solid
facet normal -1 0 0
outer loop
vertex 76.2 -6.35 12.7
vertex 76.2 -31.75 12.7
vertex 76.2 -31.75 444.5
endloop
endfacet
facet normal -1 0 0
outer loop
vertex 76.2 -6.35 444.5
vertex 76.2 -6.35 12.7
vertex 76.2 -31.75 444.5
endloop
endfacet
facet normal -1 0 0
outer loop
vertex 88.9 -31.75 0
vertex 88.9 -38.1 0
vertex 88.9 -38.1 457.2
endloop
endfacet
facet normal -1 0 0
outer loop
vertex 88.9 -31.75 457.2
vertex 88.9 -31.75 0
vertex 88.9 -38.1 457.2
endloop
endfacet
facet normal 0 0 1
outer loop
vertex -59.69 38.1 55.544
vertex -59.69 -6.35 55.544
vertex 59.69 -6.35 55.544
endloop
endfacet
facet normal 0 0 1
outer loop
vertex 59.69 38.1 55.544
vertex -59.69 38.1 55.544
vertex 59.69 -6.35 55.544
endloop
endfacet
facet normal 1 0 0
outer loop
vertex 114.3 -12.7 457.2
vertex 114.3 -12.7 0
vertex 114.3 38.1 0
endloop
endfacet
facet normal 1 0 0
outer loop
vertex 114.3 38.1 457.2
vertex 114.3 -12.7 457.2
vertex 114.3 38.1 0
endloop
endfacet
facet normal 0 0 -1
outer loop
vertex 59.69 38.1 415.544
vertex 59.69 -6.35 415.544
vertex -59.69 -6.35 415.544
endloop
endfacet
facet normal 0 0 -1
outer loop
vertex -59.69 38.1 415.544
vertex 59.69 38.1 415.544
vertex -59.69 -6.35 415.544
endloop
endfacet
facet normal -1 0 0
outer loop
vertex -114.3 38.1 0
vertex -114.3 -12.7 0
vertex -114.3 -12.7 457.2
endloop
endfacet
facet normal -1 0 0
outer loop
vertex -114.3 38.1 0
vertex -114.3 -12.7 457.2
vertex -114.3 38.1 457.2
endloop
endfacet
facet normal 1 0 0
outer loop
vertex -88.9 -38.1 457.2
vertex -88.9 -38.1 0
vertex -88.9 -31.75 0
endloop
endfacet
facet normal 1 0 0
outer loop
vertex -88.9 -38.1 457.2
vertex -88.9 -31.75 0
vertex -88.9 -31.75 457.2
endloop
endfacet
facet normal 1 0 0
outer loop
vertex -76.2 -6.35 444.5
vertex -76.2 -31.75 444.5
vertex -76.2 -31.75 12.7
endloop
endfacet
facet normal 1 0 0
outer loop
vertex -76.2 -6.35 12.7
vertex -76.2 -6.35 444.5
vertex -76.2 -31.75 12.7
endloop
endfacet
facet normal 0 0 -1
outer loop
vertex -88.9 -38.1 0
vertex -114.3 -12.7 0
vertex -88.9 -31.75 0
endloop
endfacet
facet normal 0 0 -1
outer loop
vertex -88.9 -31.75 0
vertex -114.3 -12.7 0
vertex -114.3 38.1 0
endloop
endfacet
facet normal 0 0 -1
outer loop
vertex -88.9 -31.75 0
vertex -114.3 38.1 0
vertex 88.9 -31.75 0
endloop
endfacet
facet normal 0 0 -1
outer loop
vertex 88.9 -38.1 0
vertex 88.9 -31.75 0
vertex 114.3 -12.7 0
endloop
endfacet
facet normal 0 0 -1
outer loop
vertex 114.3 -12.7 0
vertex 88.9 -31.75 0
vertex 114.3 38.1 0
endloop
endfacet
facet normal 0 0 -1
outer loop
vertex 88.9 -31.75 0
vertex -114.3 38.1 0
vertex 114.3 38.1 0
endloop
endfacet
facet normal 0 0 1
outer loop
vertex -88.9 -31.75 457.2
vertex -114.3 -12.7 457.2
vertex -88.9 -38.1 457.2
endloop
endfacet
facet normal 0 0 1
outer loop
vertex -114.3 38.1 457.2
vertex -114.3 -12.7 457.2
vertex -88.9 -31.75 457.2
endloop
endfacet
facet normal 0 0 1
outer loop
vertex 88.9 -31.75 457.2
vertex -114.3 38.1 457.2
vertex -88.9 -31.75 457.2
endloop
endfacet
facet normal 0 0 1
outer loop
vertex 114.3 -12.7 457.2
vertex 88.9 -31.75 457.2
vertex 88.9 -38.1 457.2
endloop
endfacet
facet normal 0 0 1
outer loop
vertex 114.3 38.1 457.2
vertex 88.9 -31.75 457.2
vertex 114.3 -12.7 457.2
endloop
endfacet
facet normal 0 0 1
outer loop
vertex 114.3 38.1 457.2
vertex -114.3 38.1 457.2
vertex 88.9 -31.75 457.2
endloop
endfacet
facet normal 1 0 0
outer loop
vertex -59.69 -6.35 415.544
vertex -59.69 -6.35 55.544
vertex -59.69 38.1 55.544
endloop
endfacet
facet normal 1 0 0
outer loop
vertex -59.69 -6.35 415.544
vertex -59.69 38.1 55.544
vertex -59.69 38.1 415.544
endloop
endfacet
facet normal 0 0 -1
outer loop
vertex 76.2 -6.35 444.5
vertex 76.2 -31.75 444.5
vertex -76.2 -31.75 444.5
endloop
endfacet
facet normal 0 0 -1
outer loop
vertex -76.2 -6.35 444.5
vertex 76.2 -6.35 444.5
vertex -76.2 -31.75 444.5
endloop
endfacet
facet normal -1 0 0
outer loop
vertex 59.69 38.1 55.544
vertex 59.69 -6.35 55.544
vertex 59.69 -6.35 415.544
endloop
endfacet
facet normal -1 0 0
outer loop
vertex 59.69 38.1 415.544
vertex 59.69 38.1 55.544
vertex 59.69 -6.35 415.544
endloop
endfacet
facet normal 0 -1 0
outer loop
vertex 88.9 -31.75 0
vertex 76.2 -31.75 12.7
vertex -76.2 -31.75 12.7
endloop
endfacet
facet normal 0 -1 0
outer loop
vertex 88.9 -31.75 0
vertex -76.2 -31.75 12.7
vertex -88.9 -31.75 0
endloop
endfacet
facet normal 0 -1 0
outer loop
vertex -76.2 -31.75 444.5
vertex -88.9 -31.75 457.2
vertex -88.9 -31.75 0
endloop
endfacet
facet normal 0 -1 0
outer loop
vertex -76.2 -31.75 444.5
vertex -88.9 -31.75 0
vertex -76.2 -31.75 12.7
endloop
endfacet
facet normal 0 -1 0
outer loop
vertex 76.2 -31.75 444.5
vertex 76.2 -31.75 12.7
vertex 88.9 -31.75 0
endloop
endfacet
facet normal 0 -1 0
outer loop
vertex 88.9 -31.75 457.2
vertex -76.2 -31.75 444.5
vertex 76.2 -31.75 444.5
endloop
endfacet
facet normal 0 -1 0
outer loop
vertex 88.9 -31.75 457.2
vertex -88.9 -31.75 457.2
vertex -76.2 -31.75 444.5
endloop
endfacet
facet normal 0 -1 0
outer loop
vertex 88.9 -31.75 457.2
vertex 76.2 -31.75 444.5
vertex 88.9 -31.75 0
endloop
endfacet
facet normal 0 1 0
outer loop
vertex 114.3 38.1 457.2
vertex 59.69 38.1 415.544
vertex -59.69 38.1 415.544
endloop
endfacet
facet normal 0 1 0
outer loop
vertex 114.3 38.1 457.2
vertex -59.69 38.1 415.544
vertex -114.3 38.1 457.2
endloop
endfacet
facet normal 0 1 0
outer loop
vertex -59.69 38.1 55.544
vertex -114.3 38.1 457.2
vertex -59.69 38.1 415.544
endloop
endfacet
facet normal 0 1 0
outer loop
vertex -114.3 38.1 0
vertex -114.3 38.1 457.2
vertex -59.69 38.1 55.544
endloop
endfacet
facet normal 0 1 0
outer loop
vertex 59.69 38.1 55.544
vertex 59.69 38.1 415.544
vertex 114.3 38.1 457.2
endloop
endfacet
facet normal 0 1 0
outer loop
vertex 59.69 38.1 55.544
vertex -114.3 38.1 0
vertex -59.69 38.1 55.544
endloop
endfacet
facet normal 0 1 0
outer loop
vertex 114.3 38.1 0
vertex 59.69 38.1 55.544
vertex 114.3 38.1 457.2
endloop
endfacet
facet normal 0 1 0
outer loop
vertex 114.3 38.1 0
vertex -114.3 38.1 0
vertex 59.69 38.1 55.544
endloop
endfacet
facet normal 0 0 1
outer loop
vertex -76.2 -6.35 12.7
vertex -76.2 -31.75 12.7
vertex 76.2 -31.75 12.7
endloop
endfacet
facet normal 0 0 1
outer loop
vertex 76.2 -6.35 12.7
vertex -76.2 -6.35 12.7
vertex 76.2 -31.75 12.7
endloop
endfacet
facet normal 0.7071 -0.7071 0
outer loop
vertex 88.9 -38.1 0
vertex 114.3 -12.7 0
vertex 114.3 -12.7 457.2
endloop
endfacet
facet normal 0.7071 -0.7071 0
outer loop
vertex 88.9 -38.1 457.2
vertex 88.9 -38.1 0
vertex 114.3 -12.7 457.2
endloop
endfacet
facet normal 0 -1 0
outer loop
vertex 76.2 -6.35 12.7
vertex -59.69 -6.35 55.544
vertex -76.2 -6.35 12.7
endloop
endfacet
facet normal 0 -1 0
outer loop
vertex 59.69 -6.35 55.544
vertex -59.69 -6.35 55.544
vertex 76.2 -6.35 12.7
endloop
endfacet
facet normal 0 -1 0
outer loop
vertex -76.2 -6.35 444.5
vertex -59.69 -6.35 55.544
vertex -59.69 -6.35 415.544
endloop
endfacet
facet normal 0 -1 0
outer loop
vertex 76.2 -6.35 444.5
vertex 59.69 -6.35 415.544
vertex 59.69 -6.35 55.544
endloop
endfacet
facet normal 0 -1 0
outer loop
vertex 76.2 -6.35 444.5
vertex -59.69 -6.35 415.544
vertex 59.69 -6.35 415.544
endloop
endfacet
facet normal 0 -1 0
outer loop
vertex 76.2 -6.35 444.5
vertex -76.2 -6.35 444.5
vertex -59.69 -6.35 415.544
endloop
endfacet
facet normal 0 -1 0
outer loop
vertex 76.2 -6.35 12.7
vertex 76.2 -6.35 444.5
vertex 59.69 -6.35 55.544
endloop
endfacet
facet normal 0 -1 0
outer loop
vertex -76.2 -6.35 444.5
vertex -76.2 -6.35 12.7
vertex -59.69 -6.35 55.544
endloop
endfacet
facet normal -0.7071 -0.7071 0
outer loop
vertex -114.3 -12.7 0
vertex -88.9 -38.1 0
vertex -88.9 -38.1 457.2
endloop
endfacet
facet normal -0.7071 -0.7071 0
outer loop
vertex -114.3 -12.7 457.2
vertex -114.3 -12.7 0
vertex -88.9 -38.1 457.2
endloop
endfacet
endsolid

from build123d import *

# Parameters (mm, degrees)
F0_W        = 228.6
F0_H        = 76.2
F1_DEPTH    = 457.2
F2_SIZE     = 25.4
F3_W        = 59.69
F3_H        = 360
F4_DEPTH    = 76.2
F1_FACE_W   = 177.8
F1_FACE_H   = 457.2
F1_FACE_W_2 = 119.38
F1_FACE_H_2 = 360
F5_DEPTH    = 6.35
F6_DEPTH    = 31.75


with BuildPart() as f1:
    # F0 (on Top) → F1 (new body)
    with BuildSketch(Plane.XY):
        Rectangle(F0_W, F0_H)
    extrude(amount=F1_DEPTH)

    # F2
    f2_edges = [f1.edges().sort_by_distance(p)[0] for p in [
        (-114.3, -38.1, 228.6),
        (114.3, -38.1, 228.6),
    ]]
    chamfer(f2_edges, length=F2_SIZE)

    # F3 (on face) → F4 (cut)
    with BuildSketch(Plane.XZ.offset(38.1)):
        with Locations((29.845, 235.544)):
            Rectangle(F3_W, F3_H)
        with Locations((-29.845, 235.544)):
            Rectangle(F3_W, F3_H)
    extrude(amount=-F4_DEPTH, mode=Mode.SUBTRACT)

    # F3 (on face) + F1_face (on face) → F5 (cut)
    with BuildSketch(Plane.XZ.offset(38.1)):
        Polygon((-76.2, 12.7), (0, 12.7), (0, 55.544), (-59.69, 55.544), (-59.69, 415.544), (0, 415.544), (0, 444.5), (-76.2, 444.5), align=None)
        Polygon((0, 55.544), (0, 12.7), (76.2, 12.7), (76.2, 444.5), (0, 444.5), (0, 415.544), (59.69, 415.544), (59.69, 55.544), align=None)
    with BuildSketch(Plane(origin=(0, -38.1, 228.6), x_dir=(1, 0, 0), z_dir=(0, -1, 0))):
        Rectangle(F1_FACE_W, F1_FACE_H)
        with Locations((0, 6.944)):
            Rectangle(F1_FACE_W_2, F1_FACE_H_2, mode=Mode.SUBTRACT)
    extrude(amount=-F5_DEPTH, mode=Mode.SUBTRACT)

    # F3 (on face) → F6 (cut)
    with BuildSketch(Plane.XZ.offset(38.1)):
        Polygon((0, 55.544), (0, 12.7), (76.2, 12.7), (76.2, 444.5), (0, 444.5), (0, 415.544), (59.69, 415.544), (59.69, 55.544), align=None)
        Polygon((-76.2, 12.7), (0, 12.7), (0, 55.544), (-59.69, 55.544), (-59.69, 415.544), (0, 415.544), (0, 444.5), (-76.2, 444.5), align=None)
    extrude(amount=-F6_DEPTH, mode=Mode.SUBTRACT)


solid = f1.part
